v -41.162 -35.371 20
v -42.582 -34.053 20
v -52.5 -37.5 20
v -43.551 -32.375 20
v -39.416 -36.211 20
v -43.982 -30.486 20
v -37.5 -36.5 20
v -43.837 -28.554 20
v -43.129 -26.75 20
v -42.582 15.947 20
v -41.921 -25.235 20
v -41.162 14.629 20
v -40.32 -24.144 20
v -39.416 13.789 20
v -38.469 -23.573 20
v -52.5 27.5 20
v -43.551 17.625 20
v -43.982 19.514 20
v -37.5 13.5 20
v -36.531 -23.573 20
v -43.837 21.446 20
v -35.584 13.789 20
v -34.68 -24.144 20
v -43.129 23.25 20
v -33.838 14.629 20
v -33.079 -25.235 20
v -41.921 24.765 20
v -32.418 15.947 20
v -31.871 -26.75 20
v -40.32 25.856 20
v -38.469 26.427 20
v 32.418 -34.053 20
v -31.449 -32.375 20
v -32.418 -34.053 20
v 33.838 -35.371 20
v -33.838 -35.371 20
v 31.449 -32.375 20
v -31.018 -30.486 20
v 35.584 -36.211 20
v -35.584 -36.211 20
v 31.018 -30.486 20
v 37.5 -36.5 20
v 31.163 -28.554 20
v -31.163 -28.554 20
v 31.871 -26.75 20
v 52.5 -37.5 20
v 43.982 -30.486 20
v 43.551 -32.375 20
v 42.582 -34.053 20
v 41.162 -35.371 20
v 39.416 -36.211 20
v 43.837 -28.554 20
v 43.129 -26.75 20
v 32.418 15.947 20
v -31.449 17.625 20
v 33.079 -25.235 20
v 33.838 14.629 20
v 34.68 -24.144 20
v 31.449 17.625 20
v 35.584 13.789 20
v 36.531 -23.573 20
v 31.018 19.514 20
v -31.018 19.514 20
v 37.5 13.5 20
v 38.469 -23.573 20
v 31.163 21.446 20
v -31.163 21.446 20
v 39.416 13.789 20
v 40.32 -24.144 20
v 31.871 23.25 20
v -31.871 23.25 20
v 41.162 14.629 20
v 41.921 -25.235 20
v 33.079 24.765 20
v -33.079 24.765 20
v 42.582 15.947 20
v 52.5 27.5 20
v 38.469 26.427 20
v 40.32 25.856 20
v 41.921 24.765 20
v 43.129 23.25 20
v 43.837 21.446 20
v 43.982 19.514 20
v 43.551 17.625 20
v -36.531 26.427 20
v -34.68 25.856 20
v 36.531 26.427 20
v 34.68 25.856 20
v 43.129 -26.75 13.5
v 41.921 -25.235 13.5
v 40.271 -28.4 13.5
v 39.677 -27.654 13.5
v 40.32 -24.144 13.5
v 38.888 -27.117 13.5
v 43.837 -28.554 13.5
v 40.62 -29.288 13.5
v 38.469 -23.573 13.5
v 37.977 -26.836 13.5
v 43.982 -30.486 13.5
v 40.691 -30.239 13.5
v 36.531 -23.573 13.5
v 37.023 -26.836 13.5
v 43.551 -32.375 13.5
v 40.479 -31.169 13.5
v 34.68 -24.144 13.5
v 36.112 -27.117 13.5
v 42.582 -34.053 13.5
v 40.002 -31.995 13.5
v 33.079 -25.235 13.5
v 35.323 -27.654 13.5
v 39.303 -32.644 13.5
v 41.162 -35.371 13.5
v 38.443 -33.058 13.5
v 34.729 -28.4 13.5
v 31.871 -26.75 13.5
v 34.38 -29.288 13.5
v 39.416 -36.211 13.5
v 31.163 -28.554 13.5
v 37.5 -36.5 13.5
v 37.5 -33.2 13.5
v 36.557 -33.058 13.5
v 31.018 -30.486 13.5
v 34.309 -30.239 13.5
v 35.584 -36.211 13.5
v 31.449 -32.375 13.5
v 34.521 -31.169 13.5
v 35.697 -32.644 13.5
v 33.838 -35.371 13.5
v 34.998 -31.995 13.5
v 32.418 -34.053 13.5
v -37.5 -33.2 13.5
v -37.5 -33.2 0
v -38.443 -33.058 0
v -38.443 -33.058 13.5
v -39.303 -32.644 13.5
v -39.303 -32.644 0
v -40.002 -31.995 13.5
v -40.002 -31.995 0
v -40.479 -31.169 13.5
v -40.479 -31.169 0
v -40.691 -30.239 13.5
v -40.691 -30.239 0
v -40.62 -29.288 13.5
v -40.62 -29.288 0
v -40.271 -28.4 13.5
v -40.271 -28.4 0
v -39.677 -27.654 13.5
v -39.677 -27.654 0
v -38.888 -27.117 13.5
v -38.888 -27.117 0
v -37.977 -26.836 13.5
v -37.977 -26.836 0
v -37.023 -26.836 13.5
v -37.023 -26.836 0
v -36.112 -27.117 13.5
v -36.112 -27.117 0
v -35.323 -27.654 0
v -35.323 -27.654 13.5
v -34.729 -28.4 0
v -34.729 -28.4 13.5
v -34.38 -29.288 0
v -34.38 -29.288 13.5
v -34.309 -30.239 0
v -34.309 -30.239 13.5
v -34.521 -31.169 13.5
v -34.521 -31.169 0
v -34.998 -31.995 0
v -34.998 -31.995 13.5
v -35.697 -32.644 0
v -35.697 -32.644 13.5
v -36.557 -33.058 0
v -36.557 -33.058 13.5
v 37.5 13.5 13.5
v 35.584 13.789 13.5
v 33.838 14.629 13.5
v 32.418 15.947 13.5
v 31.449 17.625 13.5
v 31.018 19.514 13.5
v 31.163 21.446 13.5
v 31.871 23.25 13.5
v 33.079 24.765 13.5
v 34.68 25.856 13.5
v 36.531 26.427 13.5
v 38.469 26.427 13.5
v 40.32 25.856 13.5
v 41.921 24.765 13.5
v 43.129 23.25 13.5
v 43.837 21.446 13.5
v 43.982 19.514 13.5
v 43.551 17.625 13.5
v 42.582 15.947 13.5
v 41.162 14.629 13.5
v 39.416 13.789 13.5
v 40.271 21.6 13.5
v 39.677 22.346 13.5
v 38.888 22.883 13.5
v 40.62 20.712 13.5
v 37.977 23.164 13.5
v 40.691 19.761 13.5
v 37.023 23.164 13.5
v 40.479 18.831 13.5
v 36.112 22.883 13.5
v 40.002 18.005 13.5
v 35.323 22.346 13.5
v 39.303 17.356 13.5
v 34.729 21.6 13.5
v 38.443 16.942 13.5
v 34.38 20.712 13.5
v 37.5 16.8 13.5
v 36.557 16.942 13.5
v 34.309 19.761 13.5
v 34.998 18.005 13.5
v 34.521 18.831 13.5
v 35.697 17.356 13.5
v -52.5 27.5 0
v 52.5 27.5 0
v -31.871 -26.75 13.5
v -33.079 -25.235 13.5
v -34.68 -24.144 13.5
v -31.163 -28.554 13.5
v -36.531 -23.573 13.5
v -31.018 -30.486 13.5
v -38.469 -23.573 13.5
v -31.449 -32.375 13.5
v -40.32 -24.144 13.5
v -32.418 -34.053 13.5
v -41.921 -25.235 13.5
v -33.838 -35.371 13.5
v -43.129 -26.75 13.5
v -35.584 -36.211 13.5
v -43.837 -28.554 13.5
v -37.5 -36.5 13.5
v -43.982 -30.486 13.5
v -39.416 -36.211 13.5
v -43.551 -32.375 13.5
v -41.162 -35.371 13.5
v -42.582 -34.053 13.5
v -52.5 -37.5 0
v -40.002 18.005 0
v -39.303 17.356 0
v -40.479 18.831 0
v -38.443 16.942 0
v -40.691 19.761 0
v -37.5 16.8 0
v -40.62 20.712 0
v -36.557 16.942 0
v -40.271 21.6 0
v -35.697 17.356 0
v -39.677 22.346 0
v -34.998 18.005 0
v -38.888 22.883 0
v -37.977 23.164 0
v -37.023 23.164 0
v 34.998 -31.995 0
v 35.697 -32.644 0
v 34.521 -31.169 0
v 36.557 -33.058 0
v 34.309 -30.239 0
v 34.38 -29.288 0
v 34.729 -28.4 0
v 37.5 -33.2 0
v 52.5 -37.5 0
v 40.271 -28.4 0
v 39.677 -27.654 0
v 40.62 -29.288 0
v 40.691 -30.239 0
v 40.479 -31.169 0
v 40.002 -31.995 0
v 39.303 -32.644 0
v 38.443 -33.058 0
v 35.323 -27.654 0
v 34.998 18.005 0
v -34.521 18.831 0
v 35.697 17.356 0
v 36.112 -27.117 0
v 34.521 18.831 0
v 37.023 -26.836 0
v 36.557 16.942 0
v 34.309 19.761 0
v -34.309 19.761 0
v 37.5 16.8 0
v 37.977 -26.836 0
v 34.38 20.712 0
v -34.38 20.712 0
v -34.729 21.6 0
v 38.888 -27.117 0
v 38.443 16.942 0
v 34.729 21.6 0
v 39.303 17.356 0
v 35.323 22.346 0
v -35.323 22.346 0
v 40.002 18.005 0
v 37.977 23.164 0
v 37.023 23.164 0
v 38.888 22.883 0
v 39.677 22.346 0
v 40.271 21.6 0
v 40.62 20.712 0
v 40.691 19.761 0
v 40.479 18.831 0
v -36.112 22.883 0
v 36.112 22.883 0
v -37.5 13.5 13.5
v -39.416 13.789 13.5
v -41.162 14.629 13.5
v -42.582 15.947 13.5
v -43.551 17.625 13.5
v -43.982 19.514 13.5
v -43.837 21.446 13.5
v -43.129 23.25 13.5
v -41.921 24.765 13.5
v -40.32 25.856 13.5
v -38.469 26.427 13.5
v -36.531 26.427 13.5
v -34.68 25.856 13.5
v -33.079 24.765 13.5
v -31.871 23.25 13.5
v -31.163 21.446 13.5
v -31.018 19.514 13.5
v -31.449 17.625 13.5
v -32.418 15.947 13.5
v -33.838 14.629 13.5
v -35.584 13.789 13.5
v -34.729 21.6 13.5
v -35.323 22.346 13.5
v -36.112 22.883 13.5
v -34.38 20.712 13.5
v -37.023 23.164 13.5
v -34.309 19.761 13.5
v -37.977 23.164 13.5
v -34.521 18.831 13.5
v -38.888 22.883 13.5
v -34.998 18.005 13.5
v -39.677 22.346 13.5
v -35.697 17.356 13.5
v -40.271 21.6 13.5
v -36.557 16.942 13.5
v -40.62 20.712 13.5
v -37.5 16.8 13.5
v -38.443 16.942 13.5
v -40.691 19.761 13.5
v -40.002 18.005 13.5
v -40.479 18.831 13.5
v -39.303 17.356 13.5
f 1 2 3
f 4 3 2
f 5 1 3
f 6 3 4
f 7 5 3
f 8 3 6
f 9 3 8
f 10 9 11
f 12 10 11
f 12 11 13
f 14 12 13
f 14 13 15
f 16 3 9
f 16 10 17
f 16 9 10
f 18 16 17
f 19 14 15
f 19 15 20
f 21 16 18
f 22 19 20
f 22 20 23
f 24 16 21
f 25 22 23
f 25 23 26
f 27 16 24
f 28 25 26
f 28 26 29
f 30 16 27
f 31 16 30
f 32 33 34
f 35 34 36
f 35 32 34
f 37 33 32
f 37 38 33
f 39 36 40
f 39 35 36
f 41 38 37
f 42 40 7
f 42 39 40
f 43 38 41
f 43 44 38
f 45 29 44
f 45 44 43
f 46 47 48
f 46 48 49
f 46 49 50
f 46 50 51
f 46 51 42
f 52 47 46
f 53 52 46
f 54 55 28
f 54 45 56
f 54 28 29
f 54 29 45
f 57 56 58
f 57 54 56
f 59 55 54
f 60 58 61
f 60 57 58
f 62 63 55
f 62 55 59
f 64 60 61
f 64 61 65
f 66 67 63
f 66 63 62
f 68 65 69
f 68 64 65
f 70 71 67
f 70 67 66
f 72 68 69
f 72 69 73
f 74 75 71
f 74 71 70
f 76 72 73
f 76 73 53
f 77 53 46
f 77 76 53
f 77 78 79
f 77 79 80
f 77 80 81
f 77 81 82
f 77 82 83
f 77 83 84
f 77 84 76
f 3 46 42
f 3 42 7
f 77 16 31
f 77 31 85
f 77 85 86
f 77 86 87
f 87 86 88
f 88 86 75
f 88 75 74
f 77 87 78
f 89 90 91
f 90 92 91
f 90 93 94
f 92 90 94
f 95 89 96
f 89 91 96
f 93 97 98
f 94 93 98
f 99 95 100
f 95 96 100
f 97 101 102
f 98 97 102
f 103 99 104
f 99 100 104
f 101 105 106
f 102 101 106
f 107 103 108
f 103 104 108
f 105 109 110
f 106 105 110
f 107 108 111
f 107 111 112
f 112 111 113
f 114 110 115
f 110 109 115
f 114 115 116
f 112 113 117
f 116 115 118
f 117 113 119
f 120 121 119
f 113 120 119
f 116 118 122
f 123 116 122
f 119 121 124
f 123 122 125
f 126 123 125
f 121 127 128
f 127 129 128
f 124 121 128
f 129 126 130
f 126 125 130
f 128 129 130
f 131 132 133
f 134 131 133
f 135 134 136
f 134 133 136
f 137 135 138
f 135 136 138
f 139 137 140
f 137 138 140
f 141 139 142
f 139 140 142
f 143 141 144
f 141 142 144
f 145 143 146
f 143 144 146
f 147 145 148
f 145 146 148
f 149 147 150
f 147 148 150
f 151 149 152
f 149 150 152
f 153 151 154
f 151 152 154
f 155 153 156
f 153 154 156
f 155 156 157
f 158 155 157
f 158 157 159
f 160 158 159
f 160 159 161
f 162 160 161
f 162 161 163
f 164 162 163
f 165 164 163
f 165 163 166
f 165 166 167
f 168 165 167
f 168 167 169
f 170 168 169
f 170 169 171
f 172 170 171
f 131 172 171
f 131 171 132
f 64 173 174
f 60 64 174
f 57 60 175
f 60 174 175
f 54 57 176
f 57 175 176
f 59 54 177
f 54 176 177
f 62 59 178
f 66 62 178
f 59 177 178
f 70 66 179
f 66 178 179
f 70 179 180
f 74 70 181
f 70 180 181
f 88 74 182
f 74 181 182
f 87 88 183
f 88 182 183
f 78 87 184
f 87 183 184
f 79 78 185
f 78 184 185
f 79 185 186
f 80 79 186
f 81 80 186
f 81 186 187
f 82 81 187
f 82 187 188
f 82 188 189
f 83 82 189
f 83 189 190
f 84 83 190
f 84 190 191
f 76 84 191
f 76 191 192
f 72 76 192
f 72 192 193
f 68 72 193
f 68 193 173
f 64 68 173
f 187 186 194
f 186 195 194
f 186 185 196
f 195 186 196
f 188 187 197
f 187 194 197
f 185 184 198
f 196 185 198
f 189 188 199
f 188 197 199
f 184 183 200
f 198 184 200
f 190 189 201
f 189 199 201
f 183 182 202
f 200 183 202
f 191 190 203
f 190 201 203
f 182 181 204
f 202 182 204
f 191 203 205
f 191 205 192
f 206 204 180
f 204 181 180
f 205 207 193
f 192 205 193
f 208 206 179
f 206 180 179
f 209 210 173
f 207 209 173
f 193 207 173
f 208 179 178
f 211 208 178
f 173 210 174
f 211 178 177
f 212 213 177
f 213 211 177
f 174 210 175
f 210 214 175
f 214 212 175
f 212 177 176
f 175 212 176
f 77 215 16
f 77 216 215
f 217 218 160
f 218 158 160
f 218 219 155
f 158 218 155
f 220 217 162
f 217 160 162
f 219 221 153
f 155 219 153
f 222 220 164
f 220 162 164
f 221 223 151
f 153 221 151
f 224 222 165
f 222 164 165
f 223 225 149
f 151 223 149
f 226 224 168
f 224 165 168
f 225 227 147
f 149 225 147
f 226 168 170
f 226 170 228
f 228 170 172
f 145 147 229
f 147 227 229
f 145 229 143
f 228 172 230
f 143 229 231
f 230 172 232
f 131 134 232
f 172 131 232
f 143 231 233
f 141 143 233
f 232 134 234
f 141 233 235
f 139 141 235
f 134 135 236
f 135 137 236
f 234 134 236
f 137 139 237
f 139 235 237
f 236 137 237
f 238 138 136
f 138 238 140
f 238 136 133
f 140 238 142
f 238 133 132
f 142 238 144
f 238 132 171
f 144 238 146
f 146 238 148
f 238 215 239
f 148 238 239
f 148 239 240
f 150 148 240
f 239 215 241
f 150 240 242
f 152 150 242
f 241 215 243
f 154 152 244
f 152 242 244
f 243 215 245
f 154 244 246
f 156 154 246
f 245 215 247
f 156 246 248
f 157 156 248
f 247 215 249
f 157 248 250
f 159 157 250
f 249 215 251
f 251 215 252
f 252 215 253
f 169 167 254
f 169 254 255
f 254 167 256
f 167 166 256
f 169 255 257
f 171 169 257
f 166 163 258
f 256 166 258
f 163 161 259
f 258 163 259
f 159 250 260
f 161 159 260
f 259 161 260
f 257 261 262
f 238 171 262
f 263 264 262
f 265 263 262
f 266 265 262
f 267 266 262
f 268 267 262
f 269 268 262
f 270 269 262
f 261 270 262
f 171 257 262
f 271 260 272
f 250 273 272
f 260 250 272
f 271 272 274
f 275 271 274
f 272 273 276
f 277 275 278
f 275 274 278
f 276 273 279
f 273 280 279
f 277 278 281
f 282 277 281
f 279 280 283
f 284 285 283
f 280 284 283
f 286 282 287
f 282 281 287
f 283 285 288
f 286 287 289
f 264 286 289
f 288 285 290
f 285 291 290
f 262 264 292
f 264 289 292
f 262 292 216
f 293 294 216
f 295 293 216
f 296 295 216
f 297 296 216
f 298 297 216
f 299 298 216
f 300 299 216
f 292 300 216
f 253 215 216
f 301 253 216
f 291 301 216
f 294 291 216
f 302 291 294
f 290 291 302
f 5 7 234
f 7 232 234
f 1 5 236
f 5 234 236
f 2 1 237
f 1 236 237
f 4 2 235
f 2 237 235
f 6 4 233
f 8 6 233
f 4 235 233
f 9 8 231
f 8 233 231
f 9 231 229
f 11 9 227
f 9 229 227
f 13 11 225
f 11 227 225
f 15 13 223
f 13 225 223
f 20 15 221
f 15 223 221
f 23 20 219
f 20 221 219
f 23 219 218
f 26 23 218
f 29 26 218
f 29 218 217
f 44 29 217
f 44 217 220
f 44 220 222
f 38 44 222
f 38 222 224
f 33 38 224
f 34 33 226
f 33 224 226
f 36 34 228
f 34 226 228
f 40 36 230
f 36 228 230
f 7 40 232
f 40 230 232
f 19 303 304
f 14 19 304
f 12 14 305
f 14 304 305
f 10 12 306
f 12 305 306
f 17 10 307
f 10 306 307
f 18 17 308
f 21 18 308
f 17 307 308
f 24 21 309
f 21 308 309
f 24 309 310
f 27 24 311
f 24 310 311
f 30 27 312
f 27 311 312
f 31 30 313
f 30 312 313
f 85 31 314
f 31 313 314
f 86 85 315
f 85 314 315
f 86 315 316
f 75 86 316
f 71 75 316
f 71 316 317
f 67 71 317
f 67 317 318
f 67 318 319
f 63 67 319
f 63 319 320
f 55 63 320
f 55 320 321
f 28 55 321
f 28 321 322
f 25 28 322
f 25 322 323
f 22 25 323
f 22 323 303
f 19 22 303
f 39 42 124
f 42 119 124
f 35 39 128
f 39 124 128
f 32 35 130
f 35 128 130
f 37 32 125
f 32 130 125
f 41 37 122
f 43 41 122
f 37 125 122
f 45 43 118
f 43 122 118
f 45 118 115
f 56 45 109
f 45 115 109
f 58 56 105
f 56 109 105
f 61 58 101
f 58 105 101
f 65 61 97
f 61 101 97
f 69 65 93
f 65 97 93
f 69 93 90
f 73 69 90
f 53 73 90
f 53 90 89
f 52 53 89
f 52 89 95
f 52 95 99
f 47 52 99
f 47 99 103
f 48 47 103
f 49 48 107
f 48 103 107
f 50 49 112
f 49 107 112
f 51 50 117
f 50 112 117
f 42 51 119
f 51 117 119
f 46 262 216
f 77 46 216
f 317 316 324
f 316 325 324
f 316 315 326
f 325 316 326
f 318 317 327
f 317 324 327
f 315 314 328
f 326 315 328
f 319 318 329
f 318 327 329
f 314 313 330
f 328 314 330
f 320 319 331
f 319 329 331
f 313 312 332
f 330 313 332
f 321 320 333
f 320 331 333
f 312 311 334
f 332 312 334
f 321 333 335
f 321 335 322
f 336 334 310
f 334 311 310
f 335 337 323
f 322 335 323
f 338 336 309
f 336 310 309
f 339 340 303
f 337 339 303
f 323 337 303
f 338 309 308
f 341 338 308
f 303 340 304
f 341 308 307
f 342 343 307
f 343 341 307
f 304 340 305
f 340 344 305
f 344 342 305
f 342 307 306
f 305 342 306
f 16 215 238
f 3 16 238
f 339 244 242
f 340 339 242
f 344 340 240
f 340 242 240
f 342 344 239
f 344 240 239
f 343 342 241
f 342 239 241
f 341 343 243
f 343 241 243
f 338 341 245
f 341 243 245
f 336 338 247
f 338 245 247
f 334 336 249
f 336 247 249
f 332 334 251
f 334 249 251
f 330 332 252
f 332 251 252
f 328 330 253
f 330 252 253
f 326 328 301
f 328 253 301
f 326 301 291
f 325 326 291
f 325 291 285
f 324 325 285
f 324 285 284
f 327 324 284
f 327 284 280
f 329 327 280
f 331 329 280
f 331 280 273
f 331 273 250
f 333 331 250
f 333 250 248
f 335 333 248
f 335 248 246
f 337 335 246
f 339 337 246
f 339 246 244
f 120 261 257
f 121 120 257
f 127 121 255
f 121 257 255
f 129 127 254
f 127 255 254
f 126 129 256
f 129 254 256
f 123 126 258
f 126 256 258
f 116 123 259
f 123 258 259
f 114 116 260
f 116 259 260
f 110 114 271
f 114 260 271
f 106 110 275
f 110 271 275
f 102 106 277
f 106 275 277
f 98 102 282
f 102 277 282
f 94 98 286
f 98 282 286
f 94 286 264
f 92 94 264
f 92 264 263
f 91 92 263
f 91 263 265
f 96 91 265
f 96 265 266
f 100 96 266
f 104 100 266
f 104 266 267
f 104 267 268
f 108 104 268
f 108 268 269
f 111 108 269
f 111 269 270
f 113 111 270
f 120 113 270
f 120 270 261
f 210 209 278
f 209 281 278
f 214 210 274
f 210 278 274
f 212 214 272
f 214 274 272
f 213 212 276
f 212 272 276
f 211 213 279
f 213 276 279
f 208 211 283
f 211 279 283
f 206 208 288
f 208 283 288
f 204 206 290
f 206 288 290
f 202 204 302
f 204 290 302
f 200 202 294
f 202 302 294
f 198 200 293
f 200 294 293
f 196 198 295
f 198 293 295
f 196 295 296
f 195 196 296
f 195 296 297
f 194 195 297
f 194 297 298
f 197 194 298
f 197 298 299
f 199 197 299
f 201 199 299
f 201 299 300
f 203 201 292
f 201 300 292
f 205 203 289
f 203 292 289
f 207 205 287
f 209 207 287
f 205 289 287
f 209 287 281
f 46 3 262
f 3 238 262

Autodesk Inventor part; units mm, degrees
ref_plane "YZ Plane" through (0, 0, 0) normal (1, 0, 0) x (0, 1, 0)
ref_plane "XZ Plane" through (0, 0, 0) normal (0, 1, 0) x (-1, 0, 0)
sketch "Sketch1" plane through (0, 0, 0) normal (0, 0, 1) x (1, 0, 0)
  line L0 (-52.5, -37.5) -> (52.5, -37.5)
  line L1 (52.5, -37.5) -> (52.5, 37.5)
  line L2 (52.5, 37.5) -> (-52.5, 37.5)
  line L3 (-52.5, 37.5) -> (-52.5, -37.5)
  line L4 (-52.5, -37.5) -> (52.5, 37.5) construction
  line L5 (52.5, -37.5) -> (-52.5, 37.5) construction
  point P0 (0, 0)
  dimension "d0" = 105
  dimension "d1" = 75
extrude "Extrusion1" add sketch "Sketch1" along normal blind 20
sketch "Sketch2" plane through (0, 0, 20) normal (0, 0, 1) x (1, 0, 0)
  line L0 (52.5, 37.5) -> (-52.5, 37.5) projected
  line L1 (-52.5, 37.5) -> (-52.5, -37.5) projected
  point P0 (0, 0)
  point P1 (-37.5, 20)
  point P2 (37.5, 20)
  point P3 (-37.5, -30)
  point P4 (37.5, -30)
  dimension "d4" = 75
  dimension "d5" = 17.5
  dimension "d6" = 17.5
  dimension "d7" = 15
  dimension "d8" = 50
  dimension "d9" = 50
  dimension "d10" = 75
  dimension "d11" = 15
hole "Hole1" at (-37.5, 20, 20) at (37.5, 20, 20) at (-37.5, -30, 20) at (37.5, -30, 20) direction (0, 0, -1) diameter 6.4 end through all counterbore diameter 13 counterbore depth 6.5 clearance for "Hex Head Bolt" size "M6" standard "Ansi Metric M Profile"
sketch "Sketch4" plane through (52.5, -37.5, 0) normal (1, 0, 0) x (0, 0, -1)
  line L0 (0, 75) -> (-20, 75) projected
  line L1 (-20, 75) -> (0, 75)
  line L2 (0, 75) -> (0, 65)
  line L3 (0, 65) -> (-20, 65)
  line L4 (-20, 65) -> (-20, 75)
  dimension "d19" = 20
  dimension "d20" = 10
extrude "Extrusion2" cut sketch "Sketch4" against normal through all
sketch "Sketch5" plane through (-52.5, -37.5, 0) normal (0, -1, 0) x (1, 0, 0)
  point P0 (52.5, 0)
sketch "Sketch7" plane through (0, 0, 20) normal (0, 0, 1) x (1, 0, 0)
  line L0 (37.5265, 13.5317) -> (37.5265, -23.5001)
  circle A0 centre (37.5, -30) radius 6.5 projected
  line L1 (37.5265, -23.5001) -> (37.5265, -13.5001)
  line L2 (37.5265, -13.5001) -> (40.9265, -13.5001)
  line L3 (40.9265, -13.5001) -> (34.1265, -13.5001)
  line L4 (37.5265, -13.5001) -> (39.2265, -13.5001)
  line L5 (39.2265, -13.5001) -> (35.8265, -13.5001)
  point P0 (0, 0)
  dimension "d41" = 10
  dimension "d42" = 3.4
  dimension "d43" = 6.8
  dimension "d44" = 1.7
  dimension "d45" = 3.4
sketch "Sketch8" plane through (0, 0, 20) normal (0, 0, 1) x (1, 0, 0)
  circle A0 centre (37.5, -30) radius 6.5 projected
  line L0 (37.5, -23.5) -> (37.5, -13.5)
  point P0 (0, 0)
  dimension "d25" = 10
ref_plane "Work Plane3" through (37.5, -13.5, 20) normal (0, -1, 0) x (1, 0, 0)
ref_plane "Work Plane4" through (37.5265, -13.5001, 20) normal (0, -1, 0) x (1, 0, 0)
sketch "Sketch10" plane through (37.5265, -13.5001, 20) normal (0, -1, 0) x (1, 0, 0)
  line L0 (1.6997, -0.0003) -> (1.6997, 1.6997)
  line L1 (-1.7001, -0.0003) -> (-1.7001, 1.6997)
  point P0 (-37.5265, -20)
  dimension "d46" = 1.7
  dimension "d47" = 1.7
hole "Hole3" at (35.8265, -13.5001, 21.6997) direction (0, 1, 0) diameter 3 depth 17
sketch "Sketch12" plane through (37.5265, -13.5001, 20) normal (0, -1, 0) x (1, 0, 0)
  line L0 (1.6597, 0) -> (1.7401, 0) projected
  line L1 (1.6999, 0) -> (1.6999, 1.7)
  point P0 (-37.5265, -20)
  dimension "d59" = 1.7
equation "\"d6\" = d5"
equation "\"d9\" = d8"
equation "\"d10\" = d4"
equation "\"d11\" = d7"
properties part number "Soporte"
